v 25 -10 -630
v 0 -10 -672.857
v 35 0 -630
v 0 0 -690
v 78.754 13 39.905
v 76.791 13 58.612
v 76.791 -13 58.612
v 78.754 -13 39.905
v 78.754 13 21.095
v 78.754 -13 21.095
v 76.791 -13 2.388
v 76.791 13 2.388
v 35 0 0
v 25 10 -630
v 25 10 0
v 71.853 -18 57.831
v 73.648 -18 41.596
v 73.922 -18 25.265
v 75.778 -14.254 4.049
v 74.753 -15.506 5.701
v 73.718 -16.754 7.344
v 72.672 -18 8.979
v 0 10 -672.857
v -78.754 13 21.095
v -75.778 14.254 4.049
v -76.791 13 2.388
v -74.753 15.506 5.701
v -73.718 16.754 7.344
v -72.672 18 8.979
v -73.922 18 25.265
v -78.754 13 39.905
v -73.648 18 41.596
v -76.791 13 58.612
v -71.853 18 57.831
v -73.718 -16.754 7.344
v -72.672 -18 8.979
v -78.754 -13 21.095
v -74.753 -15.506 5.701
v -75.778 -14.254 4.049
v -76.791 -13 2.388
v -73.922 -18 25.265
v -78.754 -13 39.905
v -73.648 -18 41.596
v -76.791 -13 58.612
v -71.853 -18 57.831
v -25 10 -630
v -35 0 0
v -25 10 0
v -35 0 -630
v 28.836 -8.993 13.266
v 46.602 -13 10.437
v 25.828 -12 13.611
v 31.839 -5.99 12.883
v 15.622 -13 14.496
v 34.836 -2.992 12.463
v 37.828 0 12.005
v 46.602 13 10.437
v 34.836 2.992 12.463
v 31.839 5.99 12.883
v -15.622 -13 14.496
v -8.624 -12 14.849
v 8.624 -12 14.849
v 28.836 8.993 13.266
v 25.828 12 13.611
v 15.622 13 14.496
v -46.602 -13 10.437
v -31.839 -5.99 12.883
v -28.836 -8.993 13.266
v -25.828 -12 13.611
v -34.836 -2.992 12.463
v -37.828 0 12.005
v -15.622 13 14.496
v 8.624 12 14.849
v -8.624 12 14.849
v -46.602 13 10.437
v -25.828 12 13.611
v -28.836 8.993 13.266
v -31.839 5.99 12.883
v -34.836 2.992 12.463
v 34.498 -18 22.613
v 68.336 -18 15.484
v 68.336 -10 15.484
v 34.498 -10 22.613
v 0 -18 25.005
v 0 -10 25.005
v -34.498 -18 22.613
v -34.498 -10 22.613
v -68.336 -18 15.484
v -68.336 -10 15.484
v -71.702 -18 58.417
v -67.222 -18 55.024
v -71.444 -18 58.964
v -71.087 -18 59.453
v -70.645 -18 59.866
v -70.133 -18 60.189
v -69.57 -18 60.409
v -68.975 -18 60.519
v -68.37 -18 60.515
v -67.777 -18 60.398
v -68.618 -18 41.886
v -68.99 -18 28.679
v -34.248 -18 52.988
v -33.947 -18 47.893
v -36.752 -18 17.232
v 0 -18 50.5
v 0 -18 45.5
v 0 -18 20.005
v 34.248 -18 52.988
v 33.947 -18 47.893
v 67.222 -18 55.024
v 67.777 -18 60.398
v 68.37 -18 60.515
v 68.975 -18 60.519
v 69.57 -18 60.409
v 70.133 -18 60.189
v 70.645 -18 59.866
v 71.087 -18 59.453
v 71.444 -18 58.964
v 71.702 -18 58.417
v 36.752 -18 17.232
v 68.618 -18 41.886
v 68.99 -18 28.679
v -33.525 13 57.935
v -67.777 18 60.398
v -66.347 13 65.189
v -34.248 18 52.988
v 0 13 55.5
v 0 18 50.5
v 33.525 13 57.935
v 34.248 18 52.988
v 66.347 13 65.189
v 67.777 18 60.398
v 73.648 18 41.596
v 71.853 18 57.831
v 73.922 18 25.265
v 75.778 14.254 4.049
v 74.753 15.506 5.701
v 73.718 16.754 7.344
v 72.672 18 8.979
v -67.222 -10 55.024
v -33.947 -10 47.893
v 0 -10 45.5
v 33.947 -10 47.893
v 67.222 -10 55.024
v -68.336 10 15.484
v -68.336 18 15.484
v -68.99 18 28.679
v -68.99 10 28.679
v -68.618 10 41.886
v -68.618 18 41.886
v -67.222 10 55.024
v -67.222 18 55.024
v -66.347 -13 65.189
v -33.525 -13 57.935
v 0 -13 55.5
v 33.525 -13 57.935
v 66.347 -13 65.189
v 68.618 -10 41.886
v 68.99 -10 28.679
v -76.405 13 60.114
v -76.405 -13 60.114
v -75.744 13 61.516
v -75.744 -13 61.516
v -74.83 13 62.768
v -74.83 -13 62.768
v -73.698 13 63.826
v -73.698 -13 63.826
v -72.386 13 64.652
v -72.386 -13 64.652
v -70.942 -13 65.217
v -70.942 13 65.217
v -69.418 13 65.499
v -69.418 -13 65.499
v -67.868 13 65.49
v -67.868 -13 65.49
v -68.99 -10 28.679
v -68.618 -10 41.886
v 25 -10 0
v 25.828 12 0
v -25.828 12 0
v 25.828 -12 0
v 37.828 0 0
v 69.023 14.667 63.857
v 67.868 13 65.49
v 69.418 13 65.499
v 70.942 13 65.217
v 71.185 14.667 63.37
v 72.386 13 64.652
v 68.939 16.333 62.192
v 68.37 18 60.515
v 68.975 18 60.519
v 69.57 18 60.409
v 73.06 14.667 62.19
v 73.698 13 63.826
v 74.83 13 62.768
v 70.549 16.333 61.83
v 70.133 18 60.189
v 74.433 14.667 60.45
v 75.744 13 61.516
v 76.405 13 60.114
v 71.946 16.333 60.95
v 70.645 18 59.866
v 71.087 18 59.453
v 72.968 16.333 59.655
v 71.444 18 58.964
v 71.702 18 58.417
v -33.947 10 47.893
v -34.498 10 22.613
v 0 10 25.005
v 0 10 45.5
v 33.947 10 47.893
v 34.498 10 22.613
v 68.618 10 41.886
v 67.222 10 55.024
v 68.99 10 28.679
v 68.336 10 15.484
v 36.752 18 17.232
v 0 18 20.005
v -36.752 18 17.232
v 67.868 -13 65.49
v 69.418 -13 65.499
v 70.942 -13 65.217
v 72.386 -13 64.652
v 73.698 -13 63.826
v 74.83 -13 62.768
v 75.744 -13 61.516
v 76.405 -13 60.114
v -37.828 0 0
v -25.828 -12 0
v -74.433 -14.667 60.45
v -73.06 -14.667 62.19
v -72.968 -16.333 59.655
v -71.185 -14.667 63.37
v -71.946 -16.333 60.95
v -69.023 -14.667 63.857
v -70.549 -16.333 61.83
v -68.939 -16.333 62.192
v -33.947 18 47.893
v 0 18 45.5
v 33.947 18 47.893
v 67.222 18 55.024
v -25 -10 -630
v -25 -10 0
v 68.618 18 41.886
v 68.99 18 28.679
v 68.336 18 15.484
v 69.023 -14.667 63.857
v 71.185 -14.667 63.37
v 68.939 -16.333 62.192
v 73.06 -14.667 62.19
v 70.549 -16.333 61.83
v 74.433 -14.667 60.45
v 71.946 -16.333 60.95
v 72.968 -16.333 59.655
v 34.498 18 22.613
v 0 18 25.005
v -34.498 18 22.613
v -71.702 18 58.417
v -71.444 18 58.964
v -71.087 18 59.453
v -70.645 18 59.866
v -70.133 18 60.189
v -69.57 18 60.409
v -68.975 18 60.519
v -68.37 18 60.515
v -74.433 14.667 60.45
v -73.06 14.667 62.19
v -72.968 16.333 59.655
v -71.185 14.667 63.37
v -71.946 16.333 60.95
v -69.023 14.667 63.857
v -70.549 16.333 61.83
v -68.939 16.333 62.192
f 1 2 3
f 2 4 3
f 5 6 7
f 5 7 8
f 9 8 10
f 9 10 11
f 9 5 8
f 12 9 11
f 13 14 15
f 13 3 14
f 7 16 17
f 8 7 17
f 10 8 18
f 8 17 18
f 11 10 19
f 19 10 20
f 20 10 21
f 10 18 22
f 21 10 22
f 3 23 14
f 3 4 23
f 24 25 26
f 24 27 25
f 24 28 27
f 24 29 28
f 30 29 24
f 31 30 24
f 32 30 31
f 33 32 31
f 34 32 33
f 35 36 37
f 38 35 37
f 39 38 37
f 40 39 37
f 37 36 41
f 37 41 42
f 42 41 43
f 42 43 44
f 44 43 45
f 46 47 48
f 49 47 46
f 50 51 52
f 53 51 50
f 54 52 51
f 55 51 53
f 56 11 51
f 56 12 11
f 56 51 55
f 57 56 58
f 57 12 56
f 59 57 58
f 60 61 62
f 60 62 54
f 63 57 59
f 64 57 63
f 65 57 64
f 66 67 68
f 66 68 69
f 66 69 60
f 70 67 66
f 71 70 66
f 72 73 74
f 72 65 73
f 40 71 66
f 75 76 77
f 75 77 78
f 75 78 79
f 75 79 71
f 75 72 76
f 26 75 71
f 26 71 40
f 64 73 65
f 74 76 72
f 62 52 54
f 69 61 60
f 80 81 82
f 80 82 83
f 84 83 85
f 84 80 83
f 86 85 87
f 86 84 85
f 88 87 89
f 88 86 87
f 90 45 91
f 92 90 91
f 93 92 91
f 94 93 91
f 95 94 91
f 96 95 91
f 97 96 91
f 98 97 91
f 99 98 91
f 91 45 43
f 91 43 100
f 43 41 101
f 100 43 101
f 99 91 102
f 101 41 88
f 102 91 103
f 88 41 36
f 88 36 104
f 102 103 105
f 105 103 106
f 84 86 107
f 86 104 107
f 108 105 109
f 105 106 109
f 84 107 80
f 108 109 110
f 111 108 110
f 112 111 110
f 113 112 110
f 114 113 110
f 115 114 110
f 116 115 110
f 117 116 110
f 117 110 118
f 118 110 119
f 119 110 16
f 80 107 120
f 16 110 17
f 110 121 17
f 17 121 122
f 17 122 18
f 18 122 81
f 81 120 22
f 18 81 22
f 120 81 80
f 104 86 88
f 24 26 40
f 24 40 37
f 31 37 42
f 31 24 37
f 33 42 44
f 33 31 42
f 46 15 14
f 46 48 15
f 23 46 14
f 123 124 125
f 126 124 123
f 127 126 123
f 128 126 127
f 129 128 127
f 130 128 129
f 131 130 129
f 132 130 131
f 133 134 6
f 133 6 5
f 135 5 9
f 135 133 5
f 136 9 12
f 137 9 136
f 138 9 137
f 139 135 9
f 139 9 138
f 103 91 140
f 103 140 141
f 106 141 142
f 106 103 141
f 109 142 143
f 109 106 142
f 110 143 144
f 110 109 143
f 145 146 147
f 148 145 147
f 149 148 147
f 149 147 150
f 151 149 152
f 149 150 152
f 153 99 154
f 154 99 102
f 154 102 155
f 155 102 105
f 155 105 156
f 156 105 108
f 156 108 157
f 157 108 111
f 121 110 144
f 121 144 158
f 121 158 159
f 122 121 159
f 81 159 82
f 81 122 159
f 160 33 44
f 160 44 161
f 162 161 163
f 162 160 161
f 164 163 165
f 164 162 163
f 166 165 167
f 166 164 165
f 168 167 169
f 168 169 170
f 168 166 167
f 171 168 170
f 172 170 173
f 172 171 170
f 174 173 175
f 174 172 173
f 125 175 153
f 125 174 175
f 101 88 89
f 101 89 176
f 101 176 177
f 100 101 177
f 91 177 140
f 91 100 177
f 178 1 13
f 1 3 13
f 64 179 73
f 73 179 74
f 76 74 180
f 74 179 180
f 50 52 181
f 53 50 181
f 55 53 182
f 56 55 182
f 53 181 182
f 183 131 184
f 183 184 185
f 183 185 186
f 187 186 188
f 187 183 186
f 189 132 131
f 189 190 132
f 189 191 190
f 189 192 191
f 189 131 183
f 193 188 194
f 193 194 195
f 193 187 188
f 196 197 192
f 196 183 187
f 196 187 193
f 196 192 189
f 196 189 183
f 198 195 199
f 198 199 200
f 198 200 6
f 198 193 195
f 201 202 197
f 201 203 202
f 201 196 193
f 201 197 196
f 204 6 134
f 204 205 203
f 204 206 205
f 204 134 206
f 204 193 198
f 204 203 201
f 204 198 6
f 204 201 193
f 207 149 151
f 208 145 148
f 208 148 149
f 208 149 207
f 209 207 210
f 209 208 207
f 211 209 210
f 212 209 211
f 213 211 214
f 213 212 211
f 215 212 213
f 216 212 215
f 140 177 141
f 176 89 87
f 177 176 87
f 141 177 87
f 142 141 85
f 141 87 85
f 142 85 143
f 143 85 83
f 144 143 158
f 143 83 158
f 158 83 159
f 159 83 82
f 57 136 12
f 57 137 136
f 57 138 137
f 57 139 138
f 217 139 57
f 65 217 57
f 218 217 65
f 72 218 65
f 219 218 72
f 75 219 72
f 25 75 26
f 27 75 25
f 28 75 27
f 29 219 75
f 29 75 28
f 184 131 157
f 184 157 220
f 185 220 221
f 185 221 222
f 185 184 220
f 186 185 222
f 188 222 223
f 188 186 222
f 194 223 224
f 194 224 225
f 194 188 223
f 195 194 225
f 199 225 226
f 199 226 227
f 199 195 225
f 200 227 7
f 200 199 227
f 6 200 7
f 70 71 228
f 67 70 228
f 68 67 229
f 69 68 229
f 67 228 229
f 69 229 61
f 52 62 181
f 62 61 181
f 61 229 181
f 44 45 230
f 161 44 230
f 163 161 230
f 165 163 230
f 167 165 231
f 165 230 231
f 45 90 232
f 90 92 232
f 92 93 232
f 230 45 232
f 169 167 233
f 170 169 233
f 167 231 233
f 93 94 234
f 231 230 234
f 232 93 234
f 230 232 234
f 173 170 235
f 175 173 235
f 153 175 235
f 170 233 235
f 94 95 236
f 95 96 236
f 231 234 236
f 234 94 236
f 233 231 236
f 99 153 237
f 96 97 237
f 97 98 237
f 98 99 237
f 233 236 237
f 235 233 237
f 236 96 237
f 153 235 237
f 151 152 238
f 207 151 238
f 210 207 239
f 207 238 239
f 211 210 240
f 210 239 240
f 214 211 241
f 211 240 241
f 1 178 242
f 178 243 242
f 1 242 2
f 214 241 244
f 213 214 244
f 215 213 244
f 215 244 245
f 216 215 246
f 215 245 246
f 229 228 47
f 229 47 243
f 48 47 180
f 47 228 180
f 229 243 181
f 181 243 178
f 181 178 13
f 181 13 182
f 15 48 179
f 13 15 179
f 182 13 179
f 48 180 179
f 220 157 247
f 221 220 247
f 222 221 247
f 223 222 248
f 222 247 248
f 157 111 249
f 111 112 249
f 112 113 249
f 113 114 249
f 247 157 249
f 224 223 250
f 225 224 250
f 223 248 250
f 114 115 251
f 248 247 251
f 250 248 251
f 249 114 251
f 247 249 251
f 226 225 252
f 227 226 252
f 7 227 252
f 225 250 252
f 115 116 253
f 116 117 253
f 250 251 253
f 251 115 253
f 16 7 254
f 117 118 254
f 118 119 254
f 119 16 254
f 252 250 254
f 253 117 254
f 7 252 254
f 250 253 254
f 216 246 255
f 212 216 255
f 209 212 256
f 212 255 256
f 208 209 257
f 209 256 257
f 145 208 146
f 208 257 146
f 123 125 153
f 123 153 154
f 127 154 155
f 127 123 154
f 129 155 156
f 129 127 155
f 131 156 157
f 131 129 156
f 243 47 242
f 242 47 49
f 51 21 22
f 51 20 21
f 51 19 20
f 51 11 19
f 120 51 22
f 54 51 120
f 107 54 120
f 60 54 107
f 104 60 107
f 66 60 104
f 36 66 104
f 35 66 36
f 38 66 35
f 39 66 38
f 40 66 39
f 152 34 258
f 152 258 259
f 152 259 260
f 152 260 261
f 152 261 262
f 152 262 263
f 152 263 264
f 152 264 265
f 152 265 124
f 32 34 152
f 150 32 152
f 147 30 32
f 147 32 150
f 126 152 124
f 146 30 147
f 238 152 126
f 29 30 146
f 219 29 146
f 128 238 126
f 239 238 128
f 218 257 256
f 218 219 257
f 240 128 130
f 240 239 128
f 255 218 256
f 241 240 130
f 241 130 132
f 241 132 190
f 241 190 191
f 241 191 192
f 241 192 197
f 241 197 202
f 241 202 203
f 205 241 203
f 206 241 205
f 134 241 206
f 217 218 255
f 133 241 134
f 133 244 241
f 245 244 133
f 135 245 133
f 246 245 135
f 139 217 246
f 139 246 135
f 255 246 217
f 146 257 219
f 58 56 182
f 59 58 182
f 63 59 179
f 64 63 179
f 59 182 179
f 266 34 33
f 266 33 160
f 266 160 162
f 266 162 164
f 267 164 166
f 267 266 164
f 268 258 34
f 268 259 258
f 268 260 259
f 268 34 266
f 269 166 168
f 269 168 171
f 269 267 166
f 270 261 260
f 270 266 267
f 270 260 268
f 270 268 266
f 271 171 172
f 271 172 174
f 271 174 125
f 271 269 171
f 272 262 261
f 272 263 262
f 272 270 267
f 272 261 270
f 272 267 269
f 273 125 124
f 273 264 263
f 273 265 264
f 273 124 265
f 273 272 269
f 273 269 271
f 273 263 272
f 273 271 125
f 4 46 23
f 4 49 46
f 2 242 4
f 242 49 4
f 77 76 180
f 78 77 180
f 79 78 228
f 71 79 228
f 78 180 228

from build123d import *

# Parameters (mm, degrees)
EXTRUDE_1_DEPTH      = 18
CHAMFER_1_SIZE       = 5
CHAMFER_2_SIZE       = 5
CUT_EXTRUDE_1_DEPTH  = 8
EXTRUDE_2_REACH      = 696.741
EXTRUDE_2_END_RADIUS = 240


with BuildPart() as part:
    # 草图4 → 放样1 section 0
    with BuildSketch(Plane(origin=(0, 10, 0), x_dir=(1, 0, 0), z_dir=(0, 1, 0))):
        with BuildLine():
            Line((25, 0), (-25, 0))
            Line((-25, 0), (-25, 630))
            Line((-25, 630), (0, 672.857142857))
            Line((0, 672.857142857), (25, 630))
            Line((25, 630), (25, 0))
        make_face()
    # 草图1 → 放样1 section 1
    with BuildSketch(Plane(origin=(0, 0, 0), x_dir=(1, 0, 0), z_dir=(0, 1, 0))):
        with BuildLine():
            Line((-35, 0), (35, 0))
            Line((35, 0), (35, 630))
            Line((35, 630), (0, 690))
            Line((0, 690), (-35, 630))
            Line((-35, 630), (-35, 0))
        make_face()
    loft_1 = loft()

    # 镜向1: 放样1 across plane
    add(loft_1.mirror(Plane.ZX))



with BuildPart() as body_2:
    # 草图5 → 凸台-拉伸1 (new, symmetric)
    with BuildSketch(Plane(origin=(0, 0, 0), x_dir=(1, 0, 0), z_dir=(0, 1, 0))):
        with BuildLine():
            ThreePointArc((-66.346774613, -65.189169183), (0, -55.5), (66.346774613, -65.189169183))
            ThreePointArc((66.346774613, -65.189169183), (73.061224406, -64.270510235), (76.791165228, -58.612302768))
            ThreePointArc((76.791165228, -58.612302768), (79, -30.5), (76.791165228, -2.387697232))
            ThreePointArc((76.791165228, -2.387697232), (0, -15.004503167), (-76.791165228, -2.387697232))
            ThreePointArc((-76.791165228, -2.387697232), (-79, -30.5), (-76.791165228, -58.612302768))
            ThreePointArc((-76.791165228, -58.612302768), (-73.061224406, -64.270510235), (-66.346774613, -65.189169183))
        make_face()
    extrude(amount=EXTRUDE_1_DEPTH, both=True)

    # 倒角1
    chamfer_1_edges = [body_2.edges().sort_by_distance(p)[0] for p in [
        (0, 18, 15.004503167),
        (-79, 18, 30.5),
        (-73.061224406, 18, 64.270510235),
        (0, 18, 55.5),
        (73.061224406, 18, 64.270510235),
        (0, -18, 55.5),
        (-73.061224406, -18, 64.270510235),
        (-79, -18, 30.5),
        (79, -18, 30.5),
        (73.061224406, -18, 64.270510235),
        (79, 18, 30.5),
    ]]
    chamfer(chamfer_1_edges, length=CHAMFER_1_SIZE)

    # 倒角2
    chamfer_2_edges = [body_2.edges().sort_by_distance(p)[0] for p in [
        (0, -18, 15.004503167),
    ]]
    chamfer(chamfer_2_edges, length=CHAMFER_2_SIZE)

    # 草图6 → 切除-拉伸1 (cut)
    with BuildSketch(Plane(origin=(0, 18, 0), x_dir=(1, 0, 0), z_dir=(0, 1, 0))):
        with BuildLine():
            ThreePointArc((67.221840199, -55.023712607), (68.932610365, -35.286223394), (68.335500378, -15.483731767))
            ThreePointArc((68.335500378, -15.483731767), (0, -25.004503167), (-68.335500378, -15.483731767))
            ThreePointArc((-68.335500378, -15.483731767), (-68.932610365, -35.286223394), (-67.221840199, -55.023712607))
            ThreePointArc((-67.221840199, -55.023712607), (0, -45.5), (67.221840199, -55.023712607))
        make_face()
    cut_extrude_1 = extrude(amount=-CUT_EXTRUDE_1_DEPTH, mode=Mode.SUBTRACT)

    # 镜向2: 切除-拉伸1 across plane
    add(cut_extrude_1.mirror(Plane.ZX), mode=Mode.SUBTRACT)


with BuildPart() as part_1:
    add(part.part)

    add(body_2.part)  # 凸台-拉伸2 merges body 2
    # 凸台-拉伸2: up to this cylinder (the profile starts inside it)
    extrude_2_end = Plane(origin=(0, 0, -224.995496833), z_dir=(0, -1, 0)) * Cylinder(EXTRUDE_2_END_RADIUS, 1874.482, mode=Mode.PRIVATE)
    # 草图7 → 凸台-拉伸2 (add, up to the surface)
    with BuildSketch(Plane.XY, mode=Mode.PRIVATE) as extrude_2_sk1:
        Polygon((-25.828427125, 12), (-37.828427125, 0), (-25.828427125, -12), (25.828427125, -12), (37.828427125, 0), (25.828427125, 12), align=None)
    extrude_2_tool1 = extrude(extrude_2_sk1.sketch, amount=EXTRUDE_2_REACH, mode=Mode.PRIVATE) & extrude_2_end
    add(extrude_2_tool1.solids().sort_by_distance((0, 0, 0))[0])


solid = part_1.part
